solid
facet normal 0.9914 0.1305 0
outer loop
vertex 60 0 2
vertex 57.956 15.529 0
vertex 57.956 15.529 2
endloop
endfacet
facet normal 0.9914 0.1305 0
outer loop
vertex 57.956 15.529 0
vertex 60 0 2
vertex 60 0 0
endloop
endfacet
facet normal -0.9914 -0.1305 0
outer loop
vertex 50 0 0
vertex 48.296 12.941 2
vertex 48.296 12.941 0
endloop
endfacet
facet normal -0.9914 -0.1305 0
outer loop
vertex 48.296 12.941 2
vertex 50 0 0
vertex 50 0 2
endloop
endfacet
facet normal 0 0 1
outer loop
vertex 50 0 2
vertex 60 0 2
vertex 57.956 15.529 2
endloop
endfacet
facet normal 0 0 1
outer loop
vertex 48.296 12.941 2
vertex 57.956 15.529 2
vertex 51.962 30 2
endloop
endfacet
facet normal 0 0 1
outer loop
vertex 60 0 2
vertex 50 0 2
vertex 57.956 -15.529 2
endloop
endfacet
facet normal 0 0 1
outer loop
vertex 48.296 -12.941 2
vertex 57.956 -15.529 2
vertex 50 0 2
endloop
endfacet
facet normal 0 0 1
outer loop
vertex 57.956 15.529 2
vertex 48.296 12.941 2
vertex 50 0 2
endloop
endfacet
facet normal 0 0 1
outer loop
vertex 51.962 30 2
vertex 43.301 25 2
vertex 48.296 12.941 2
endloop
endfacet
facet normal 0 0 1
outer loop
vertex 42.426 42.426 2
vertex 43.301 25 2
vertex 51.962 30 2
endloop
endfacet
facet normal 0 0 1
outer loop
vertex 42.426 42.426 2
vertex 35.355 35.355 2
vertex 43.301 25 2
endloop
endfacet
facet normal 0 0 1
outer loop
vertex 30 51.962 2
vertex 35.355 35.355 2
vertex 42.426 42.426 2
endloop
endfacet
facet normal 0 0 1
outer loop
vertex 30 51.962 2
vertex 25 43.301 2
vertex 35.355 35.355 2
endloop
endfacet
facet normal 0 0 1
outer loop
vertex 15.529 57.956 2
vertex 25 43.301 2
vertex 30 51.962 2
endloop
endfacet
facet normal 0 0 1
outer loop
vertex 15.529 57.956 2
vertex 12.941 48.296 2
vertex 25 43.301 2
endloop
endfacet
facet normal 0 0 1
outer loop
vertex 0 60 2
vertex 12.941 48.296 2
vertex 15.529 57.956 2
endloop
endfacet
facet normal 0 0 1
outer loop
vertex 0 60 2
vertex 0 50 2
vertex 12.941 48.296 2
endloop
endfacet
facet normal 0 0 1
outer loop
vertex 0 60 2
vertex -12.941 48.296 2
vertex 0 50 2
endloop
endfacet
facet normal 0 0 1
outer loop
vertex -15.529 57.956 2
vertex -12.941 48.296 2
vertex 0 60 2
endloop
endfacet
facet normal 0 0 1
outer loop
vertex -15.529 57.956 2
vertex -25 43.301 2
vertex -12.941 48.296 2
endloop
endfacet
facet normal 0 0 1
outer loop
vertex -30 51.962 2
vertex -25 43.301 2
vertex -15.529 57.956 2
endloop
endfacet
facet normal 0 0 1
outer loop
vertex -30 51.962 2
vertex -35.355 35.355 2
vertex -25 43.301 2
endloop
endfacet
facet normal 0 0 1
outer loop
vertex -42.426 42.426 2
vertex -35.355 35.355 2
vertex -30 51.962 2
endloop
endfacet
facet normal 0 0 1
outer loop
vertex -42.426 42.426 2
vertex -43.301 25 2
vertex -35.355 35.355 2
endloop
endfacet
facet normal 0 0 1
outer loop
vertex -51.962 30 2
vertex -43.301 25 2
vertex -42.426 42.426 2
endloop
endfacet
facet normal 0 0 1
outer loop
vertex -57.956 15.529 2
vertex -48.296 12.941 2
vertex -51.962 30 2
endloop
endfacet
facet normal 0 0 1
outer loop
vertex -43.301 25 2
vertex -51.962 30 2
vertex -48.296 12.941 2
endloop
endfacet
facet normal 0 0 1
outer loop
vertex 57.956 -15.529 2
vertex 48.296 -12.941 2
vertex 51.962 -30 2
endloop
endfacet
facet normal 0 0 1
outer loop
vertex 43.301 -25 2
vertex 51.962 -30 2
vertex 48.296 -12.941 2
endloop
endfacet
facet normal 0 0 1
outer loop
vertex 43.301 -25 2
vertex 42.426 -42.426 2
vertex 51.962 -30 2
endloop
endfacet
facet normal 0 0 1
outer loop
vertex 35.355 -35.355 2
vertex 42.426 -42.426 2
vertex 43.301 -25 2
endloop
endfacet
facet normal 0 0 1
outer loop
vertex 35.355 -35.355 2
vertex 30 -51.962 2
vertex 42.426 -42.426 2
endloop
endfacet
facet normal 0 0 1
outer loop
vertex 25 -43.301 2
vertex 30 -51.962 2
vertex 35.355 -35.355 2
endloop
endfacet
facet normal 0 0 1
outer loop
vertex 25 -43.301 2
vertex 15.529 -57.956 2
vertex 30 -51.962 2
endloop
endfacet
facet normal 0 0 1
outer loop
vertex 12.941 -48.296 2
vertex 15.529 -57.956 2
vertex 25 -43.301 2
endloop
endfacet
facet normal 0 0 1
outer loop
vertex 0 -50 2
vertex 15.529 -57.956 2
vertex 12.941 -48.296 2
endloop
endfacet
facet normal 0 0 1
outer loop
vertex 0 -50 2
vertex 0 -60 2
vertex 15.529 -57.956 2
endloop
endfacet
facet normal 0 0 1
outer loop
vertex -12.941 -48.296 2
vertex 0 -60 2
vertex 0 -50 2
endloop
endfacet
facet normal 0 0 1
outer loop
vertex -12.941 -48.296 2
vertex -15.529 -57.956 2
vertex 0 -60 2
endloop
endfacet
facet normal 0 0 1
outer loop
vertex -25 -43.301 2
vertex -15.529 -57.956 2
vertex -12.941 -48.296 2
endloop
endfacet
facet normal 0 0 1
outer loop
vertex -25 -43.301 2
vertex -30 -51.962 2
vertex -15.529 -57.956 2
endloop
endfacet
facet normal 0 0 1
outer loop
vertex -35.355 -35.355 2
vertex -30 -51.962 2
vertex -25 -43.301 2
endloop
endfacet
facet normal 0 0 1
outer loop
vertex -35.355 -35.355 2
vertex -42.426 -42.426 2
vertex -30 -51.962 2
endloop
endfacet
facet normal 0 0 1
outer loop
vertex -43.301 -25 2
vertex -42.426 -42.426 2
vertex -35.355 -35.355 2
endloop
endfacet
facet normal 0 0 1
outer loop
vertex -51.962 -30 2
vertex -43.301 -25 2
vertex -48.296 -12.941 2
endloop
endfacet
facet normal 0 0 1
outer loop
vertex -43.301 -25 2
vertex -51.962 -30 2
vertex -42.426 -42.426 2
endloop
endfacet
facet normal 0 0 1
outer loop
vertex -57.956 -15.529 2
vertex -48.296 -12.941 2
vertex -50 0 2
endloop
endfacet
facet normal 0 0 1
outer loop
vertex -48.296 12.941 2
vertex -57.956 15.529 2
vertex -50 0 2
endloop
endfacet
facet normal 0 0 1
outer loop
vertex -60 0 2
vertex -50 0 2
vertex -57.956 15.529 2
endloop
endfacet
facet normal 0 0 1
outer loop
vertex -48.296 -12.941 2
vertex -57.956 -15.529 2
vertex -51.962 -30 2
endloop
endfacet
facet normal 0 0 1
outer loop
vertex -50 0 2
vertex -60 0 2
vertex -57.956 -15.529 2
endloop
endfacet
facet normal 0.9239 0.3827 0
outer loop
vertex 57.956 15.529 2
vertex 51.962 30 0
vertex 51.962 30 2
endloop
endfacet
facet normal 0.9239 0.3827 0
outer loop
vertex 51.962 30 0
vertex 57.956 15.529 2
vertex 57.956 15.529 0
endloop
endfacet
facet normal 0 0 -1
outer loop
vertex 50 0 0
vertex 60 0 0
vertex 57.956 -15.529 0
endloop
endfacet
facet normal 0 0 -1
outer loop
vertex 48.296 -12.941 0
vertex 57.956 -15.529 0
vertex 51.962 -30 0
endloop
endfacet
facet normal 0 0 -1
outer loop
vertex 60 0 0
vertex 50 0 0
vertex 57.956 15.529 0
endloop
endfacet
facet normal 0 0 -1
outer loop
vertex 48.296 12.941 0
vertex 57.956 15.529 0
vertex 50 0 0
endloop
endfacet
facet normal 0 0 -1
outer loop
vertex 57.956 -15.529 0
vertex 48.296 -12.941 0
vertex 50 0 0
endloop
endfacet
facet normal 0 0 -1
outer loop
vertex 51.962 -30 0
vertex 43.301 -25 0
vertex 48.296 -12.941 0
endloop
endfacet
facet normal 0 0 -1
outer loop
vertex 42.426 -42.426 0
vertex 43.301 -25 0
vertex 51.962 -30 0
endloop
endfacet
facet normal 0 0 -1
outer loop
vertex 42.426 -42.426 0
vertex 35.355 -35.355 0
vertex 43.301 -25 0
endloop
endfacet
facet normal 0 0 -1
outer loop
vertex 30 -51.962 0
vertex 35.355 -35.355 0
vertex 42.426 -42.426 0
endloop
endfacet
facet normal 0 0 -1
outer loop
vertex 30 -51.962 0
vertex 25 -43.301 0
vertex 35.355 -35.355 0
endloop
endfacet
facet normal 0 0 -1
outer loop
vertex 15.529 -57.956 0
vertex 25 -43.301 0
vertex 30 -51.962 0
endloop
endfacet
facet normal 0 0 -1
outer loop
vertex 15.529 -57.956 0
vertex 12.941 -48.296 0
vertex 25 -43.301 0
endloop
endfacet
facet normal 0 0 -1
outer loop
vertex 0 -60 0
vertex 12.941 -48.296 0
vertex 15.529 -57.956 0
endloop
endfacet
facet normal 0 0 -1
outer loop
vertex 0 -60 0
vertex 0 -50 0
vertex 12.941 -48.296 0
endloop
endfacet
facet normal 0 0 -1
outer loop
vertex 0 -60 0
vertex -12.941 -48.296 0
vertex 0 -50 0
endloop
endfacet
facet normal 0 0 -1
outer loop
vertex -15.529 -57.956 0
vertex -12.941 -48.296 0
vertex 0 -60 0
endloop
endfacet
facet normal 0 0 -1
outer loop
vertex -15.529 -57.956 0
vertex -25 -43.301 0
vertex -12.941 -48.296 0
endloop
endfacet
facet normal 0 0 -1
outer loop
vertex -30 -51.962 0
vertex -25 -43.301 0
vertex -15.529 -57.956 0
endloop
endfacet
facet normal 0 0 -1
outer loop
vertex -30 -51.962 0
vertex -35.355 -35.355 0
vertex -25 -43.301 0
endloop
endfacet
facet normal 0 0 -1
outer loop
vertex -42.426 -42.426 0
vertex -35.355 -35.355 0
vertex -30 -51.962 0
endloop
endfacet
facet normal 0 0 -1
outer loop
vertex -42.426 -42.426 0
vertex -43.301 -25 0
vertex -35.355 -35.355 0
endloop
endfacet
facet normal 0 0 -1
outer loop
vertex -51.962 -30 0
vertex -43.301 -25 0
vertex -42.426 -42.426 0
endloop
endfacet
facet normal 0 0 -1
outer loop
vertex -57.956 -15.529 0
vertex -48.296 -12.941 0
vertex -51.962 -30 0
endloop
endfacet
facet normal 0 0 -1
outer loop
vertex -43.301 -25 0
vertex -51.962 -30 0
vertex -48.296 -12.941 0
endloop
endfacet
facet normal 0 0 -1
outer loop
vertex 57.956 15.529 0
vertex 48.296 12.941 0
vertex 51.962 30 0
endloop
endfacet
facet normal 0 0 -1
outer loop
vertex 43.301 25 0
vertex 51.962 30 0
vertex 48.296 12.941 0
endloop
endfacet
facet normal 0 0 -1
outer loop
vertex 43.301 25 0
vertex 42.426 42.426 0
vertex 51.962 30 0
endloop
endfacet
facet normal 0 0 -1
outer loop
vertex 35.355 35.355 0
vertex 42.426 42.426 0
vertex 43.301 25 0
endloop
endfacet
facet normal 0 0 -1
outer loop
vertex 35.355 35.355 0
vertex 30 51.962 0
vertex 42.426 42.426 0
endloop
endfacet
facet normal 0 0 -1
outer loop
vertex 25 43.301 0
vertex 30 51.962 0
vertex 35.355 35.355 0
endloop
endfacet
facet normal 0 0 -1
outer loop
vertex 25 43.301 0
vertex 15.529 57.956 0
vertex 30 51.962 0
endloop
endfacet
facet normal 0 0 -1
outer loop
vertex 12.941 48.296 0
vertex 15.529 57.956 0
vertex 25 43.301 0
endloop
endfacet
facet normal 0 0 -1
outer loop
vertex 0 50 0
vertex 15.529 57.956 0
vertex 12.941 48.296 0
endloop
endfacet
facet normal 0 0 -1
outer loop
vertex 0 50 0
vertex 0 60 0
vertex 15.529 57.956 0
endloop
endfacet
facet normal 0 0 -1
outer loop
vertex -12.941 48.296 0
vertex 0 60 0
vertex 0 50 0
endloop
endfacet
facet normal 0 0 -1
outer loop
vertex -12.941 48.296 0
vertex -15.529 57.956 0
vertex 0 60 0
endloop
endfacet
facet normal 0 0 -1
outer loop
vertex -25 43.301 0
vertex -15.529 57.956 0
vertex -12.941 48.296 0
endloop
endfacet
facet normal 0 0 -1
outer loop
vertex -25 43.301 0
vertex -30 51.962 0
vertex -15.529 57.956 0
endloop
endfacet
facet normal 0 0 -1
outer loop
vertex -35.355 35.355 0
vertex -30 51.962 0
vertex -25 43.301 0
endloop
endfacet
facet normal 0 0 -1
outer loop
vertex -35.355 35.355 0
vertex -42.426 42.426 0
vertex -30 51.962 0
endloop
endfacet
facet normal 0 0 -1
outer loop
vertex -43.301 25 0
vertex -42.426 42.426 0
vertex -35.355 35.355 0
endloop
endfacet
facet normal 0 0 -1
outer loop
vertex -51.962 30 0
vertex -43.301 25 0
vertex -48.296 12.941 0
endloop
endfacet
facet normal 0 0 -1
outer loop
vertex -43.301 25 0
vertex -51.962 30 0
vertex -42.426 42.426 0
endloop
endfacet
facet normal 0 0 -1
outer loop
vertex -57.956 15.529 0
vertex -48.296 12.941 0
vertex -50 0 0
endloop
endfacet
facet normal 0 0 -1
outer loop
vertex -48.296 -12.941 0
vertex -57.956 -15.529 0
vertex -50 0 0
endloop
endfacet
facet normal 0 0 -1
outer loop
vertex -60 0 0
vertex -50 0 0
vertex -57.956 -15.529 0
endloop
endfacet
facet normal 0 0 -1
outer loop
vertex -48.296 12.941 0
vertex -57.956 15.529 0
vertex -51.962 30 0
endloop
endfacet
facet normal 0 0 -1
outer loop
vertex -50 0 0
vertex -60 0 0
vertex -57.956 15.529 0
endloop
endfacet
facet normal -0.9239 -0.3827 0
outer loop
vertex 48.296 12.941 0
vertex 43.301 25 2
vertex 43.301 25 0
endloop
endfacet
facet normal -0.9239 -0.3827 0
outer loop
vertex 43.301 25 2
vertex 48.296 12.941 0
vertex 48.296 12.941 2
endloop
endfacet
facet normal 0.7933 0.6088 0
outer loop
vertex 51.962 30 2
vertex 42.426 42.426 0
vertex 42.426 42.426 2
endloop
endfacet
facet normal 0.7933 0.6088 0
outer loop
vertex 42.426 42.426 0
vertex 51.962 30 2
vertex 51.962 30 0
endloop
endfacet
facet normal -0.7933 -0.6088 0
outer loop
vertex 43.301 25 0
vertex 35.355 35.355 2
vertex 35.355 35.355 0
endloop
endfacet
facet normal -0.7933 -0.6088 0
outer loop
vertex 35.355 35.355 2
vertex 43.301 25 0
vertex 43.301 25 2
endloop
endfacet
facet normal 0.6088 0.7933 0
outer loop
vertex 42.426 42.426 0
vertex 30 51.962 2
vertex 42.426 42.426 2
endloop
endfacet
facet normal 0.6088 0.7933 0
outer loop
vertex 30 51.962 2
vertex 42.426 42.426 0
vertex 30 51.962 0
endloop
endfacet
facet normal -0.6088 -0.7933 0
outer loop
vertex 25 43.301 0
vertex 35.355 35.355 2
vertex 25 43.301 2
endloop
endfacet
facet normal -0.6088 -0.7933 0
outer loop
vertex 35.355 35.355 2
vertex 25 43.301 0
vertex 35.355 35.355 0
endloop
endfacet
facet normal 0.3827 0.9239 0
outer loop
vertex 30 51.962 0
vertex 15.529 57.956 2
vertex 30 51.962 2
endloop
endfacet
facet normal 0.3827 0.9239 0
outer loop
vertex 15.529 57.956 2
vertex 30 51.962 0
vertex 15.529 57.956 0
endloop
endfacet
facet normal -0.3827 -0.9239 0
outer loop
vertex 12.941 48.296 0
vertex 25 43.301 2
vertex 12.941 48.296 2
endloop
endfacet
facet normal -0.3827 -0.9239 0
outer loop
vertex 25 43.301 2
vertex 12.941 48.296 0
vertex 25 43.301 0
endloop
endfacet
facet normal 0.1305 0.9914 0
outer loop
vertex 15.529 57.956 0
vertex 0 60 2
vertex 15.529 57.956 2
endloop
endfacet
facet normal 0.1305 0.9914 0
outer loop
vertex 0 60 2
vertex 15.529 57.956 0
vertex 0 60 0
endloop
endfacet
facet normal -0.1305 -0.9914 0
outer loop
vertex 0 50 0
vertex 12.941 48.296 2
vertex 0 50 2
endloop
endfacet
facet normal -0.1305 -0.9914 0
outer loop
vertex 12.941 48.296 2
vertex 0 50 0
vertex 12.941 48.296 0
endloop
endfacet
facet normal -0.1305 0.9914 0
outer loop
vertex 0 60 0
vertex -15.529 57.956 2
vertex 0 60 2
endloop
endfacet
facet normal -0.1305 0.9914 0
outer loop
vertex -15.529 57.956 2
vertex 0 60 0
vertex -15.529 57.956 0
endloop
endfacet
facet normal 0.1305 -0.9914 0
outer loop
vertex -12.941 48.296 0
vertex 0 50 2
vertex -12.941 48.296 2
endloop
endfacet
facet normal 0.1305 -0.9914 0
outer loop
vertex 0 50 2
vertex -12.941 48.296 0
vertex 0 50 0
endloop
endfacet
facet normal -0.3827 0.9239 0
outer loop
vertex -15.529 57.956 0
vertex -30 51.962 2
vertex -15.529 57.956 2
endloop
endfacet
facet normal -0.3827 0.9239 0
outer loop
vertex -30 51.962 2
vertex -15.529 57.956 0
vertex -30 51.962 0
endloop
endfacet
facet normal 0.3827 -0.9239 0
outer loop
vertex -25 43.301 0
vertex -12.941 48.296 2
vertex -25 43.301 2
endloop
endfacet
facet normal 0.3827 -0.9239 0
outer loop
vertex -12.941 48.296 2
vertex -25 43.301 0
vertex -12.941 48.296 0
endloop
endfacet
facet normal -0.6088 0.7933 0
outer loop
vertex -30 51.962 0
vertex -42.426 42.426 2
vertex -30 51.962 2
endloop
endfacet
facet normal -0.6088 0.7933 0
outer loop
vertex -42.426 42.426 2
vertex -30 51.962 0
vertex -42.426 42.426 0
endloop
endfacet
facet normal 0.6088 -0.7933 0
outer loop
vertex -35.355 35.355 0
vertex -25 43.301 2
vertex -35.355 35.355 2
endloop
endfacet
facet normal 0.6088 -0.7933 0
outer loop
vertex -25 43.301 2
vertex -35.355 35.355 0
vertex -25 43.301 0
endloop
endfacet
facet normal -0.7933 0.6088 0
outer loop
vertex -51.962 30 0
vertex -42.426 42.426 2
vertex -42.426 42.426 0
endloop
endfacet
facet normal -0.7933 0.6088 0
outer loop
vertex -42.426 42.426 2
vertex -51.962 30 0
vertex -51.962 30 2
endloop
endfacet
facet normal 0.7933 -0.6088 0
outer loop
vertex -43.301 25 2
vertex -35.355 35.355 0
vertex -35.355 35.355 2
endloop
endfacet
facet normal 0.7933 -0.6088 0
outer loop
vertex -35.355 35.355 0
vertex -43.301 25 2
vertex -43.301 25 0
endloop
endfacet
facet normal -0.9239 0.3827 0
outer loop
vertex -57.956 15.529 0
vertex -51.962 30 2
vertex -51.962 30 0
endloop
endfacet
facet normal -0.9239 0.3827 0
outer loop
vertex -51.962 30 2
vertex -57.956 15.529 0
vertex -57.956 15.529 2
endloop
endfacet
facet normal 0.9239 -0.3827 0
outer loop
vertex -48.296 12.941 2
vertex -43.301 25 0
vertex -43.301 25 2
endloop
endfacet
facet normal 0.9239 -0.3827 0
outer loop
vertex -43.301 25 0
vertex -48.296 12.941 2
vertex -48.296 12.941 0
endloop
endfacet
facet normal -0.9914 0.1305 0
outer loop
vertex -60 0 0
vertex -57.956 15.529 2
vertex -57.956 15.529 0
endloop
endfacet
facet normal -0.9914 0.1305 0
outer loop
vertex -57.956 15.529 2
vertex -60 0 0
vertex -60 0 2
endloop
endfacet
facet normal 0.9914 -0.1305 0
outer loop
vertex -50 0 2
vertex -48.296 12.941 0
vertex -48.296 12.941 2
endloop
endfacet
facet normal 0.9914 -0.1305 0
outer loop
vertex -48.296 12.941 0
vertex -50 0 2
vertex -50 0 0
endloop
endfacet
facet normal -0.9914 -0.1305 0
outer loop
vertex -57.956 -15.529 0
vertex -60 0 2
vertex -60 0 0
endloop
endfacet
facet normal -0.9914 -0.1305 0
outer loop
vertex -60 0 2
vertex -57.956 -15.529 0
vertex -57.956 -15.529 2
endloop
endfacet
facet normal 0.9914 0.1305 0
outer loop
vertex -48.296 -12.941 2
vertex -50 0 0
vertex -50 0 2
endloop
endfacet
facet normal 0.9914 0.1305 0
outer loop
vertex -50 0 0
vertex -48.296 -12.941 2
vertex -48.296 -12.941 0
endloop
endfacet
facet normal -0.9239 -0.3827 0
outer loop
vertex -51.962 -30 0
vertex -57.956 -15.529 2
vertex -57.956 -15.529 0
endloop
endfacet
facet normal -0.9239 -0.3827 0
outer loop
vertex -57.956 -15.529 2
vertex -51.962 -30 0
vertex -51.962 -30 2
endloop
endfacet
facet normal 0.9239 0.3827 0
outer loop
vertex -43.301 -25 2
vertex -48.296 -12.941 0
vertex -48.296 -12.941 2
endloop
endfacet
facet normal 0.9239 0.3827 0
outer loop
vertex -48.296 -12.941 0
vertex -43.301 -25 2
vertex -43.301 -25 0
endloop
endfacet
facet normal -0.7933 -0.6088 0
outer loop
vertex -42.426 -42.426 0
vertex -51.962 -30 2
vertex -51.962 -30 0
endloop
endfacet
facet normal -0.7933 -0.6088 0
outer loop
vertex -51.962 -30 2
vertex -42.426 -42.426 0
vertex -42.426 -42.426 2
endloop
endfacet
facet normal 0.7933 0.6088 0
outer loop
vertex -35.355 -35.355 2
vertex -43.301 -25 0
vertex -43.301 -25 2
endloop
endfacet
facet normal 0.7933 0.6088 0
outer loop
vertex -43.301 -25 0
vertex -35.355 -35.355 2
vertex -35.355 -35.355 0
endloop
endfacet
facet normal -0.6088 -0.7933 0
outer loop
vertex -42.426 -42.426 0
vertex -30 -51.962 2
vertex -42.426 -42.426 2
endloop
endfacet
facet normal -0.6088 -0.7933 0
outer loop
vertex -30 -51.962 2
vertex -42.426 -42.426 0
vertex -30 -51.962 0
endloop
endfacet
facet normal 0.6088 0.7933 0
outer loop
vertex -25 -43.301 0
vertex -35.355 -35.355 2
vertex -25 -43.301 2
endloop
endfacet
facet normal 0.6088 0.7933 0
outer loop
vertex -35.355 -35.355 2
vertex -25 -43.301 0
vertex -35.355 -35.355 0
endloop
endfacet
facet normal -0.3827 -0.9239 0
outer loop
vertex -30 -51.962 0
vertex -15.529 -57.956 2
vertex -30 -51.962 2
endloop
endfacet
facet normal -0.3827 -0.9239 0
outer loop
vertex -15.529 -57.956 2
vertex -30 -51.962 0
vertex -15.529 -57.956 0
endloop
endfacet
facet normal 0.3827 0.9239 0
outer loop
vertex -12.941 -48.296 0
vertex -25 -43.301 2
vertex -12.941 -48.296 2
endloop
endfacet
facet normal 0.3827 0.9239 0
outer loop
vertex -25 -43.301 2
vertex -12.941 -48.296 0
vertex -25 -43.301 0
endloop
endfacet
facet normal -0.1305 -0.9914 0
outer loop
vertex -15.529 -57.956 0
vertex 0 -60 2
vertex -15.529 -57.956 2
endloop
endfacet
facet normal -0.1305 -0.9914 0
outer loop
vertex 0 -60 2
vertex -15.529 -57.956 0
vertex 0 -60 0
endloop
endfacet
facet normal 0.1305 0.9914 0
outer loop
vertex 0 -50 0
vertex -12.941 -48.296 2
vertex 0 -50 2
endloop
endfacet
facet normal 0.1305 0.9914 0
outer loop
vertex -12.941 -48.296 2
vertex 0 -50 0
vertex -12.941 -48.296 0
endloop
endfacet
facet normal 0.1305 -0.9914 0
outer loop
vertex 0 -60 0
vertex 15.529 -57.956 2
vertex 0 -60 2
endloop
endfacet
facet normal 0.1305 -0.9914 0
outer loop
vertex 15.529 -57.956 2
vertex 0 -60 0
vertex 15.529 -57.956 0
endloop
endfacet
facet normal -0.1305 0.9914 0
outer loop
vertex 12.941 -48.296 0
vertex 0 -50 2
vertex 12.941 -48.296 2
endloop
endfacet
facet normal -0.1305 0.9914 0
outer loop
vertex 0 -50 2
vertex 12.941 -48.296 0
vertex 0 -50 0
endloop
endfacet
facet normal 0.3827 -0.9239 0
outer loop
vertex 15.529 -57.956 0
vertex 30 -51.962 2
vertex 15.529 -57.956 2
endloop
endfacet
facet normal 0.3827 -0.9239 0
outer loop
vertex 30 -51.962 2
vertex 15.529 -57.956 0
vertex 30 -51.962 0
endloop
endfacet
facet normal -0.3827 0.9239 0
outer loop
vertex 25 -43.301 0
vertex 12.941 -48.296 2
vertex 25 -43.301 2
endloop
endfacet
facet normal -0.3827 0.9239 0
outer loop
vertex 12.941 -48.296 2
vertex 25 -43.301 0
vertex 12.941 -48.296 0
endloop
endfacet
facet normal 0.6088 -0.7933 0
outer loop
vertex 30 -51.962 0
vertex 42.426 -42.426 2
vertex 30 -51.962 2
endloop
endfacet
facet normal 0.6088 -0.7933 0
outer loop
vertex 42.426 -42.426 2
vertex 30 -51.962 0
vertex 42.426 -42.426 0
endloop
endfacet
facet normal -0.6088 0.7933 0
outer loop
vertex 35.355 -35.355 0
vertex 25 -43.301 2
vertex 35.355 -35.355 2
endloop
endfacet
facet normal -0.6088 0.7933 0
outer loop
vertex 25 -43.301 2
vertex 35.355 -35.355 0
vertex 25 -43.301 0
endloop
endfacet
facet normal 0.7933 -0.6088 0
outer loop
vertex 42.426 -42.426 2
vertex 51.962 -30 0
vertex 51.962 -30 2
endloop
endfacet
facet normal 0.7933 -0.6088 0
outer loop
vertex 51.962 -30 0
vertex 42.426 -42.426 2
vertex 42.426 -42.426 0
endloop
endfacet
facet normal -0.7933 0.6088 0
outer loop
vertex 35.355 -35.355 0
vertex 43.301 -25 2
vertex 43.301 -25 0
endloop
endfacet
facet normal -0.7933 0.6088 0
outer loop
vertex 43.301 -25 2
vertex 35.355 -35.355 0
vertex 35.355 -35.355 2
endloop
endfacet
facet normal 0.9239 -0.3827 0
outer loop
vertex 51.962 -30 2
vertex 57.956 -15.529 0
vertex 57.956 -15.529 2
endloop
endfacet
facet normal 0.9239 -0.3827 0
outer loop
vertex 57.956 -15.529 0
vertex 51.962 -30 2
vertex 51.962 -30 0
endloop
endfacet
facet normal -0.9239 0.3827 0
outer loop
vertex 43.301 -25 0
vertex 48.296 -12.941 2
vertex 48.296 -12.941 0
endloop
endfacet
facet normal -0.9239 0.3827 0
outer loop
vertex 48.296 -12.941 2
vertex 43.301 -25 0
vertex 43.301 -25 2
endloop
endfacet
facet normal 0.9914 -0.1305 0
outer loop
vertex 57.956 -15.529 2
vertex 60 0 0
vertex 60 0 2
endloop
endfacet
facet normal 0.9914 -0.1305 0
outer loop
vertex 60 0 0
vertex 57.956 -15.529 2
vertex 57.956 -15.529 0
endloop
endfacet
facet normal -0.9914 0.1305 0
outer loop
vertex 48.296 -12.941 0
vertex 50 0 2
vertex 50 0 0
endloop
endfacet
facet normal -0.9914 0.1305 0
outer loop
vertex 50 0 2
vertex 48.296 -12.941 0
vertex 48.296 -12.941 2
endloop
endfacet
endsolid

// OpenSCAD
// Colour wheel: 12 blades, each one tagged with its own colour.
// The converter turns every colour() scope into a separate part and picks a
// filament blend for it.
segments = 12;
height = 2;

function hsv_to_rgb(h, s, v) =
    let (i = floor(h * 6), f = h * 6 - i,
         p = v * (1 - s), q = v * (1 - f * s), t = v * (1 - (1 - f) * s))
    i % 6 == 0 ? [v, t, p] :
    i % 6 == 1 ? [q, v, p] :
    i % 6 == 2 ? [p, v, t] :
    i % 6 == 3 ? [p, q, v] :
    i % 6 == 4 ? [t, p, v] : [v, p, q];

for (index = [0 : segments - 1]) {
    color(hsv_to_rgb(index / segments, 1, 1))
        rotate(index * 360 / segments)
            rotate_extrude(angle = 360 / segments)
                translate([50, 0])
                    square([10, height]);
}
